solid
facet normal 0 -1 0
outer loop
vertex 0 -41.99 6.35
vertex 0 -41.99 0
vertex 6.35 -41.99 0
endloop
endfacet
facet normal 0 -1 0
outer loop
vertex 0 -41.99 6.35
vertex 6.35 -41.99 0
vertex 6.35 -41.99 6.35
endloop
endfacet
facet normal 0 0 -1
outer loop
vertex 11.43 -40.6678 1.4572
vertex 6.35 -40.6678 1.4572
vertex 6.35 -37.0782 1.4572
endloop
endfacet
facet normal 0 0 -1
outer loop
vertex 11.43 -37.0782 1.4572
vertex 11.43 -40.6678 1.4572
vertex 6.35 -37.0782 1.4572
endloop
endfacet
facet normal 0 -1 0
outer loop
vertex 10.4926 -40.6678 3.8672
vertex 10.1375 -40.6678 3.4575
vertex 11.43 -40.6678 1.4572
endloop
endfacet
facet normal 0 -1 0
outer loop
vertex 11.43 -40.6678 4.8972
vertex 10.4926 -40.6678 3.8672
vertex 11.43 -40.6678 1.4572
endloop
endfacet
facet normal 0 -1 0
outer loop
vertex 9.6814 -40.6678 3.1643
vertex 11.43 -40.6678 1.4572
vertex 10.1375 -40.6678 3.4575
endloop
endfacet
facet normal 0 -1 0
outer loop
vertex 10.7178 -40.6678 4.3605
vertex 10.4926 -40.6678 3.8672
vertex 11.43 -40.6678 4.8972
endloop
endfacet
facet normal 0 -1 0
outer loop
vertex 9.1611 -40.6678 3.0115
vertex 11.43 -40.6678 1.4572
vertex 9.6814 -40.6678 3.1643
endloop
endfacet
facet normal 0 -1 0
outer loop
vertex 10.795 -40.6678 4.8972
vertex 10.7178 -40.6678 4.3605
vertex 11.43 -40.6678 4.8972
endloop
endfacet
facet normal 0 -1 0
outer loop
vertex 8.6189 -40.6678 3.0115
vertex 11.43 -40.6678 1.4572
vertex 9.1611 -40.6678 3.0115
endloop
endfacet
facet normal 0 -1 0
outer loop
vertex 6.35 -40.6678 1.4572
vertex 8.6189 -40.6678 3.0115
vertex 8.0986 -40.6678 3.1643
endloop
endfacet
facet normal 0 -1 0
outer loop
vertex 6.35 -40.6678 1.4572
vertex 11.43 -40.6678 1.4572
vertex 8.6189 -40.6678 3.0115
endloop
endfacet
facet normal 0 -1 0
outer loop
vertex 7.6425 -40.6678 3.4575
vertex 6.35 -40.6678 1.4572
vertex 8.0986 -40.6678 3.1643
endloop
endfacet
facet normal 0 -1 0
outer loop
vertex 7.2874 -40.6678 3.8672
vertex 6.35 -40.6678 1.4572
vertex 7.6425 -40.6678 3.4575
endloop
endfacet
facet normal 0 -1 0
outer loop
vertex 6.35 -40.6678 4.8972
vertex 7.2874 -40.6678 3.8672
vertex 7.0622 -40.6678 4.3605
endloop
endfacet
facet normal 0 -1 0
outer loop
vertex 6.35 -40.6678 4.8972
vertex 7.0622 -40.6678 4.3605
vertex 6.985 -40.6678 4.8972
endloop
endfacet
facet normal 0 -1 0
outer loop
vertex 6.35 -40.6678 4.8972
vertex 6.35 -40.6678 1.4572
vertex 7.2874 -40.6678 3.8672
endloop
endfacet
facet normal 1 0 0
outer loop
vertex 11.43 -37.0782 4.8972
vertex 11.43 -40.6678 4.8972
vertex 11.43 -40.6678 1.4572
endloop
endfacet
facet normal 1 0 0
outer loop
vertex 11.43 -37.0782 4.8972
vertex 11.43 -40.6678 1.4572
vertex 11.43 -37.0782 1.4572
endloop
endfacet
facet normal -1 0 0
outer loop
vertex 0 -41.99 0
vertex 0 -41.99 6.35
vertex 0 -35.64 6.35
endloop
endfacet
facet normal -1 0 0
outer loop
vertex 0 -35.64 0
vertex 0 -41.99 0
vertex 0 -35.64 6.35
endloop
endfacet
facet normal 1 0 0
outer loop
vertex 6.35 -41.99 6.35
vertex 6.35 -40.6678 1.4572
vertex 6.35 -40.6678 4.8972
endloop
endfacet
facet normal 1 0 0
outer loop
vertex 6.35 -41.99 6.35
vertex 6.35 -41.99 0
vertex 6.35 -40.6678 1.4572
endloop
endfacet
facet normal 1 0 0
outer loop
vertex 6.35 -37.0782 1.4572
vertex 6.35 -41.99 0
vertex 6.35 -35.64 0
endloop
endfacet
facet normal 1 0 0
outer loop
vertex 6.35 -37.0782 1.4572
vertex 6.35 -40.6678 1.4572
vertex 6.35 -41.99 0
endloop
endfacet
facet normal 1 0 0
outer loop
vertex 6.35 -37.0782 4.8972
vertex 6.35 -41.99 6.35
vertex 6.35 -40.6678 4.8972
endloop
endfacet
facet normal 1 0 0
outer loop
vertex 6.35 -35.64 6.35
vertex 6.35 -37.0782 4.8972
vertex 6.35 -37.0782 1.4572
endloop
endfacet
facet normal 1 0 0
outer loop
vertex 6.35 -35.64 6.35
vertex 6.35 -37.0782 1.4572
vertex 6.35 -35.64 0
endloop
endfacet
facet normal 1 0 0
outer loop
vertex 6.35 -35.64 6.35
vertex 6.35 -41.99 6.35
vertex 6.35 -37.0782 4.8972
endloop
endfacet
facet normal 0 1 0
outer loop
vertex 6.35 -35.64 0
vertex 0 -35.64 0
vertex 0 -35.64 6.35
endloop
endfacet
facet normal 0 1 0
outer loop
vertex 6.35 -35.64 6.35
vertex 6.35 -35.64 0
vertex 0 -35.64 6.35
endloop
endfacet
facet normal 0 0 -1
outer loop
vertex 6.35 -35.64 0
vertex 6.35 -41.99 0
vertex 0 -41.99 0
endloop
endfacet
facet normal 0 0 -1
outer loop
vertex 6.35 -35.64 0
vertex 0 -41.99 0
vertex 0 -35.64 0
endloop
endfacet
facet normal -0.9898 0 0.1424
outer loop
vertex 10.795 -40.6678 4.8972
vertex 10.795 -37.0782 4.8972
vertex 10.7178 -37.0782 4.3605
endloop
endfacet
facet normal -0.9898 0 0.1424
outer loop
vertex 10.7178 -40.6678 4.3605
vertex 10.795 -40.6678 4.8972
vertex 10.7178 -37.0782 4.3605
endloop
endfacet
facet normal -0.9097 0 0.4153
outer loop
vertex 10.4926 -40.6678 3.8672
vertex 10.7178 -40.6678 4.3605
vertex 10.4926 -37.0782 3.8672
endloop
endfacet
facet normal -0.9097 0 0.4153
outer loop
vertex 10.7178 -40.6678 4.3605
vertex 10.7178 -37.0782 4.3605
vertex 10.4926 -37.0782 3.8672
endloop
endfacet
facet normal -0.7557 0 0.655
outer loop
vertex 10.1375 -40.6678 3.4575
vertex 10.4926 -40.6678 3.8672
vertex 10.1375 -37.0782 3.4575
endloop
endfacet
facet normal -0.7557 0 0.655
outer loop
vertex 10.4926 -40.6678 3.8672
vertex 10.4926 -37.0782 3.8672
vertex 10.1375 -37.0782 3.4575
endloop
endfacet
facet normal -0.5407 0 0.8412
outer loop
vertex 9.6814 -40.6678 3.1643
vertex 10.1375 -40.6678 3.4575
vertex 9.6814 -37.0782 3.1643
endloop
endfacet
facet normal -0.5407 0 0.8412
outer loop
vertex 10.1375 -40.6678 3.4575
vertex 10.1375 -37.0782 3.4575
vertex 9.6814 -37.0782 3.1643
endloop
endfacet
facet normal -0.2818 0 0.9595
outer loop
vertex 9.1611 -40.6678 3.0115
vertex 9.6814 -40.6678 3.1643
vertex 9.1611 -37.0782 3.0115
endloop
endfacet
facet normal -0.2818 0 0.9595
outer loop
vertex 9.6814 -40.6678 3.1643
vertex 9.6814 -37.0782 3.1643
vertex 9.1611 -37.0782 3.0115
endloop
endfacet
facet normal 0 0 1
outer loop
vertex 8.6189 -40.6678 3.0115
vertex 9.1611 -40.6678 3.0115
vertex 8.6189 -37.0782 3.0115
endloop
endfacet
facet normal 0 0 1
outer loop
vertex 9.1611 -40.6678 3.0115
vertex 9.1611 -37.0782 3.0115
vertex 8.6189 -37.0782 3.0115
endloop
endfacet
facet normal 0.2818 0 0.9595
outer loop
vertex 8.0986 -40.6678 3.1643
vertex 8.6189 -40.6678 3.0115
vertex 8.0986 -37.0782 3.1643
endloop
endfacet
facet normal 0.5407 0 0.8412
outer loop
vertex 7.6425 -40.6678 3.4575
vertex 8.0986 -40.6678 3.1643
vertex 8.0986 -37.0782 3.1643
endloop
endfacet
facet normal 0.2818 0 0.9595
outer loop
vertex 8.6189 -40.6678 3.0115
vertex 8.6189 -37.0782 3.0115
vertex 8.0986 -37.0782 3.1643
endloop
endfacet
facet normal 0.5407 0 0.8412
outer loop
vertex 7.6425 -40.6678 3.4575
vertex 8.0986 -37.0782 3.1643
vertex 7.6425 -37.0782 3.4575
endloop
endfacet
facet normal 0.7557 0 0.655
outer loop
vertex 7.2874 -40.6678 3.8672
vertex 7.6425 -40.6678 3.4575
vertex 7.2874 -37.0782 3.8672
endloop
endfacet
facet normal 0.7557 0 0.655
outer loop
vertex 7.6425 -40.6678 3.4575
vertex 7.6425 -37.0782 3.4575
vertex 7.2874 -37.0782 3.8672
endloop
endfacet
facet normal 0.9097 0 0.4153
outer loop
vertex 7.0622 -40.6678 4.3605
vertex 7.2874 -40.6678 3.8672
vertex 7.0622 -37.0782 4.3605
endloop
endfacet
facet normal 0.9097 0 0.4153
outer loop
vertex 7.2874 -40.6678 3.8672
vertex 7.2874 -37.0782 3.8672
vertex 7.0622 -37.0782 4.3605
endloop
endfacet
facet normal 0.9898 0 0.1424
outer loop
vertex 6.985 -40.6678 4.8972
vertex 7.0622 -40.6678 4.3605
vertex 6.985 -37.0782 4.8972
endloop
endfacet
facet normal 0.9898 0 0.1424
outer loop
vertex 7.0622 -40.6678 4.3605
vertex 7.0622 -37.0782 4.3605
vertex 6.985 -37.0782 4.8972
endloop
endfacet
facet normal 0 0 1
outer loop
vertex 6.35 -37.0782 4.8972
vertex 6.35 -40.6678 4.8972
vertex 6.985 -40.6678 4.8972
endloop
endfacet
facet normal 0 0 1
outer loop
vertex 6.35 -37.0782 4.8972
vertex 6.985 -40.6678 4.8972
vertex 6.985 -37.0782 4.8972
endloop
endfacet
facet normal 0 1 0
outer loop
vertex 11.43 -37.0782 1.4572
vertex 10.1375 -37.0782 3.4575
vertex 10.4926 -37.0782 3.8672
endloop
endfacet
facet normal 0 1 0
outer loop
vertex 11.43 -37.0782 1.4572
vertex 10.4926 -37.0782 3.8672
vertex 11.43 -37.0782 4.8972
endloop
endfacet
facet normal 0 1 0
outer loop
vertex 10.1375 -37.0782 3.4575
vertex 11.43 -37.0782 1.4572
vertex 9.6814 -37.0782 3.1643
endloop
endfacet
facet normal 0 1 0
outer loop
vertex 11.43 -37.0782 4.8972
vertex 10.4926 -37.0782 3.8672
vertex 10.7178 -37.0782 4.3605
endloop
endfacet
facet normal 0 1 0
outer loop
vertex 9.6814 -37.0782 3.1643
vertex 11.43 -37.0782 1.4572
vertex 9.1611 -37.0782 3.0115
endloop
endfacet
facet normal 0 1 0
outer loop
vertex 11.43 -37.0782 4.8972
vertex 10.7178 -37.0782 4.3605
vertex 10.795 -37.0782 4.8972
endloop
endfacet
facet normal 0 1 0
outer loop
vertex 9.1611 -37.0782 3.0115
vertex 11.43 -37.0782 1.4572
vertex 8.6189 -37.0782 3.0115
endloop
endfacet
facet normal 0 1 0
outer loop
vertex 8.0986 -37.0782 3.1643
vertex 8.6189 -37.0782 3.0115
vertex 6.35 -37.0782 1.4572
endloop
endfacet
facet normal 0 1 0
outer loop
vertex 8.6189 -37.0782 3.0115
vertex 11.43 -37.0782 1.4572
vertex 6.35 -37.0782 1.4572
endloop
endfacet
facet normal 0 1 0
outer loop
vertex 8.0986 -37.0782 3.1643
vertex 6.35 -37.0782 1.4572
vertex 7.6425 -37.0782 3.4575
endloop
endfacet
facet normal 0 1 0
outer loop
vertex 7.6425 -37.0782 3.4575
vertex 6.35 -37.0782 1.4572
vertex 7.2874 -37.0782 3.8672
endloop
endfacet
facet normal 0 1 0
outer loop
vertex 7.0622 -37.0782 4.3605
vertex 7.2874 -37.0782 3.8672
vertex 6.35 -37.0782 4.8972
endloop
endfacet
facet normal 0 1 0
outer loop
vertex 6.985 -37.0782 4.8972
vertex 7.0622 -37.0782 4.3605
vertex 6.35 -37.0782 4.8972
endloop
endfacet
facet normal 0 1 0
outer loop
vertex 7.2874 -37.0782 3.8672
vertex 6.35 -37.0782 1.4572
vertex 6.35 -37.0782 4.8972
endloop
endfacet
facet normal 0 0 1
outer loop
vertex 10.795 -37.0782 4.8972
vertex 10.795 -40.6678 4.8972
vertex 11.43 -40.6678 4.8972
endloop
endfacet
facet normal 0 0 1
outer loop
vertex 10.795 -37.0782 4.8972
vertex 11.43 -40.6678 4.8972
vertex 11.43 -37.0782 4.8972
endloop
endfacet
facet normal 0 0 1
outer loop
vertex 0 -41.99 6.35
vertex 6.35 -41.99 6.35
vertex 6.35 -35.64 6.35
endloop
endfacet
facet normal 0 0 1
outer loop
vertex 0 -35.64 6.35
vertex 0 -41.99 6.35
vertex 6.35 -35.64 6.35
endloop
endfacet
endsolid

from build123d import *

# Parameters (mm, degrees)
F0_W     = 6.35
F0_H     = 6.35
F1_DEPTH = 6.35
F2_W     = 3.589511
F2_H     = 3.439947
F3_DEPTH = 2.54
F4_W     = 3.589511
F4_H     = 3.439947
F5_DEPTH = 2.54
F7_D     = 3.81


with BuildPart() as f1:
    # F0 (on Right) → F1 (new body)
    with BuildSketch(Plane.YZ):
        with Locations((-38.814982, 3.175)):
            Rectangle(F0_W, F0_H)
    extrude(amount=F1_DEPTH)



with BuildPart() as f3:
    # F2 (on face) → F3 (new body)
    with BuildSketch(Plane.YZ.offset(8.89)):
        with Locations((-38.873002, 3.177181)):
            Rectangle(F2_W, F2_H)
    extrude(amount=F3_DEPTH)


with BuildPart() as f1_1:
    add(f1.part)

    add(f3.part)  # F5 merges F3
    # F4 (on face) → F5 (join)
    with BuildSketch(Plane.YZ.offset(6.35)):
        with Locations((-38.873002, 3.177181)):
            Rectangle(F4_W, F4_H)
    extrude(amount=F5_DEPTH)

    # F7 (through all)
    with Locations(Plane.XZ.offset(40.667757)):
        with Locations((8.89, 4.897155)):
            Hole(F7_D / 2)


solid = f1_1.part
